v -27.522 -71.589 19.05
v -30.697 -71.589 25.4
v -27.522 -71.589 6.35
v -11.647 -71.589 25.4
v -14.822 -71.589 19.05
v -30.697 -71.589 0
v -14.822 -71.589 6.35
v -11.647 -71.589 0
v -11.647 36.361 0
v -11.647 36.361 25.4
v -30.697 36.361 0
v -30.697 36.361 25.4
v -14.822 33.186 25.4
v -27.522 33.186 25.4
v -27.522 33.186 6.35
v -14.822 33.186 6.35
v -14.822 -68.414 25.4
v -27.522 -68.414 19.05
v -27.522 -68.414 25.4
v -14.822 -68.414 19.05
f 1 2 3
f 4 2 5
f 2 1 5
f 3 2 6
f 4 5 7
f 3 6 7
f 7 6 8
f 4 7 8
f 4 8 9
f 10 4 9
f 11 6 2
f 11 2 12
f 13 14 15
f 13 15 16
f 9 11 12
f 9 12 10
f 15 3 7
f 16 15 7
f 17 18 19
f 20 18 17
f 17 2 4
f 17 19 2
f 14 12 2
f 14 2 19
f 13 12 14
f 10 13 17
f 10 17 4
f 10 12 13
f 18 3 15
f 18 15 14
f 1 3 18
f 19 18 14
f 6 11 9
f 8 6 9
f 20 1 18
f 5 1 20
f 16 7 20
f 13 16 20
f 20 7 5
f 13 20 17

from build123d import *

# Parameters (mm, degrees)
F0_W     = 19.05
F0_H     = 107.95
F0_W_2   = 12.7
F0_H_2   = 101.6
F1_DEPTH = 25.4
F2_DEPTH = 6.35
F3_W     = 12.7
F3_H     = 12.7
F4_DEPTH = 25.4


with BuildPart() as f1:
    # F0 (on Top) → F1 (new body)
    with BuildSketch(Plane.XY):
        with Locations((-21.172236, -17.613889)):
            Rectangle(F0_W, F0_H)
        with Locations((-21.172236, -17.613889)):
            Rectangle(F0_W_2, F0_H_2, mode=Mode.SUBTRACT)
    extrude(amount=F1_DEPTH)

    # F0 (on Top) → F2 (join)
    with BuildSketch(Plane.XY):
        with Locations((-21.172236, -17.613889)):
            Rectangle(F0_W_2, F0_H_2)
    extrude(amount=F2_DEPTH)

    # F3 (on face) → F4 (cut)
    with BuildSketch(Plane.XZ.offset(71.588889)):
        with Locations((-21.172236, 12.7)):
            Rectangle(F3_W, F3_H)
    extrude(amount=-F4_DEPTH, mode=Mode.SUBTRACT)


solid = f1.part
